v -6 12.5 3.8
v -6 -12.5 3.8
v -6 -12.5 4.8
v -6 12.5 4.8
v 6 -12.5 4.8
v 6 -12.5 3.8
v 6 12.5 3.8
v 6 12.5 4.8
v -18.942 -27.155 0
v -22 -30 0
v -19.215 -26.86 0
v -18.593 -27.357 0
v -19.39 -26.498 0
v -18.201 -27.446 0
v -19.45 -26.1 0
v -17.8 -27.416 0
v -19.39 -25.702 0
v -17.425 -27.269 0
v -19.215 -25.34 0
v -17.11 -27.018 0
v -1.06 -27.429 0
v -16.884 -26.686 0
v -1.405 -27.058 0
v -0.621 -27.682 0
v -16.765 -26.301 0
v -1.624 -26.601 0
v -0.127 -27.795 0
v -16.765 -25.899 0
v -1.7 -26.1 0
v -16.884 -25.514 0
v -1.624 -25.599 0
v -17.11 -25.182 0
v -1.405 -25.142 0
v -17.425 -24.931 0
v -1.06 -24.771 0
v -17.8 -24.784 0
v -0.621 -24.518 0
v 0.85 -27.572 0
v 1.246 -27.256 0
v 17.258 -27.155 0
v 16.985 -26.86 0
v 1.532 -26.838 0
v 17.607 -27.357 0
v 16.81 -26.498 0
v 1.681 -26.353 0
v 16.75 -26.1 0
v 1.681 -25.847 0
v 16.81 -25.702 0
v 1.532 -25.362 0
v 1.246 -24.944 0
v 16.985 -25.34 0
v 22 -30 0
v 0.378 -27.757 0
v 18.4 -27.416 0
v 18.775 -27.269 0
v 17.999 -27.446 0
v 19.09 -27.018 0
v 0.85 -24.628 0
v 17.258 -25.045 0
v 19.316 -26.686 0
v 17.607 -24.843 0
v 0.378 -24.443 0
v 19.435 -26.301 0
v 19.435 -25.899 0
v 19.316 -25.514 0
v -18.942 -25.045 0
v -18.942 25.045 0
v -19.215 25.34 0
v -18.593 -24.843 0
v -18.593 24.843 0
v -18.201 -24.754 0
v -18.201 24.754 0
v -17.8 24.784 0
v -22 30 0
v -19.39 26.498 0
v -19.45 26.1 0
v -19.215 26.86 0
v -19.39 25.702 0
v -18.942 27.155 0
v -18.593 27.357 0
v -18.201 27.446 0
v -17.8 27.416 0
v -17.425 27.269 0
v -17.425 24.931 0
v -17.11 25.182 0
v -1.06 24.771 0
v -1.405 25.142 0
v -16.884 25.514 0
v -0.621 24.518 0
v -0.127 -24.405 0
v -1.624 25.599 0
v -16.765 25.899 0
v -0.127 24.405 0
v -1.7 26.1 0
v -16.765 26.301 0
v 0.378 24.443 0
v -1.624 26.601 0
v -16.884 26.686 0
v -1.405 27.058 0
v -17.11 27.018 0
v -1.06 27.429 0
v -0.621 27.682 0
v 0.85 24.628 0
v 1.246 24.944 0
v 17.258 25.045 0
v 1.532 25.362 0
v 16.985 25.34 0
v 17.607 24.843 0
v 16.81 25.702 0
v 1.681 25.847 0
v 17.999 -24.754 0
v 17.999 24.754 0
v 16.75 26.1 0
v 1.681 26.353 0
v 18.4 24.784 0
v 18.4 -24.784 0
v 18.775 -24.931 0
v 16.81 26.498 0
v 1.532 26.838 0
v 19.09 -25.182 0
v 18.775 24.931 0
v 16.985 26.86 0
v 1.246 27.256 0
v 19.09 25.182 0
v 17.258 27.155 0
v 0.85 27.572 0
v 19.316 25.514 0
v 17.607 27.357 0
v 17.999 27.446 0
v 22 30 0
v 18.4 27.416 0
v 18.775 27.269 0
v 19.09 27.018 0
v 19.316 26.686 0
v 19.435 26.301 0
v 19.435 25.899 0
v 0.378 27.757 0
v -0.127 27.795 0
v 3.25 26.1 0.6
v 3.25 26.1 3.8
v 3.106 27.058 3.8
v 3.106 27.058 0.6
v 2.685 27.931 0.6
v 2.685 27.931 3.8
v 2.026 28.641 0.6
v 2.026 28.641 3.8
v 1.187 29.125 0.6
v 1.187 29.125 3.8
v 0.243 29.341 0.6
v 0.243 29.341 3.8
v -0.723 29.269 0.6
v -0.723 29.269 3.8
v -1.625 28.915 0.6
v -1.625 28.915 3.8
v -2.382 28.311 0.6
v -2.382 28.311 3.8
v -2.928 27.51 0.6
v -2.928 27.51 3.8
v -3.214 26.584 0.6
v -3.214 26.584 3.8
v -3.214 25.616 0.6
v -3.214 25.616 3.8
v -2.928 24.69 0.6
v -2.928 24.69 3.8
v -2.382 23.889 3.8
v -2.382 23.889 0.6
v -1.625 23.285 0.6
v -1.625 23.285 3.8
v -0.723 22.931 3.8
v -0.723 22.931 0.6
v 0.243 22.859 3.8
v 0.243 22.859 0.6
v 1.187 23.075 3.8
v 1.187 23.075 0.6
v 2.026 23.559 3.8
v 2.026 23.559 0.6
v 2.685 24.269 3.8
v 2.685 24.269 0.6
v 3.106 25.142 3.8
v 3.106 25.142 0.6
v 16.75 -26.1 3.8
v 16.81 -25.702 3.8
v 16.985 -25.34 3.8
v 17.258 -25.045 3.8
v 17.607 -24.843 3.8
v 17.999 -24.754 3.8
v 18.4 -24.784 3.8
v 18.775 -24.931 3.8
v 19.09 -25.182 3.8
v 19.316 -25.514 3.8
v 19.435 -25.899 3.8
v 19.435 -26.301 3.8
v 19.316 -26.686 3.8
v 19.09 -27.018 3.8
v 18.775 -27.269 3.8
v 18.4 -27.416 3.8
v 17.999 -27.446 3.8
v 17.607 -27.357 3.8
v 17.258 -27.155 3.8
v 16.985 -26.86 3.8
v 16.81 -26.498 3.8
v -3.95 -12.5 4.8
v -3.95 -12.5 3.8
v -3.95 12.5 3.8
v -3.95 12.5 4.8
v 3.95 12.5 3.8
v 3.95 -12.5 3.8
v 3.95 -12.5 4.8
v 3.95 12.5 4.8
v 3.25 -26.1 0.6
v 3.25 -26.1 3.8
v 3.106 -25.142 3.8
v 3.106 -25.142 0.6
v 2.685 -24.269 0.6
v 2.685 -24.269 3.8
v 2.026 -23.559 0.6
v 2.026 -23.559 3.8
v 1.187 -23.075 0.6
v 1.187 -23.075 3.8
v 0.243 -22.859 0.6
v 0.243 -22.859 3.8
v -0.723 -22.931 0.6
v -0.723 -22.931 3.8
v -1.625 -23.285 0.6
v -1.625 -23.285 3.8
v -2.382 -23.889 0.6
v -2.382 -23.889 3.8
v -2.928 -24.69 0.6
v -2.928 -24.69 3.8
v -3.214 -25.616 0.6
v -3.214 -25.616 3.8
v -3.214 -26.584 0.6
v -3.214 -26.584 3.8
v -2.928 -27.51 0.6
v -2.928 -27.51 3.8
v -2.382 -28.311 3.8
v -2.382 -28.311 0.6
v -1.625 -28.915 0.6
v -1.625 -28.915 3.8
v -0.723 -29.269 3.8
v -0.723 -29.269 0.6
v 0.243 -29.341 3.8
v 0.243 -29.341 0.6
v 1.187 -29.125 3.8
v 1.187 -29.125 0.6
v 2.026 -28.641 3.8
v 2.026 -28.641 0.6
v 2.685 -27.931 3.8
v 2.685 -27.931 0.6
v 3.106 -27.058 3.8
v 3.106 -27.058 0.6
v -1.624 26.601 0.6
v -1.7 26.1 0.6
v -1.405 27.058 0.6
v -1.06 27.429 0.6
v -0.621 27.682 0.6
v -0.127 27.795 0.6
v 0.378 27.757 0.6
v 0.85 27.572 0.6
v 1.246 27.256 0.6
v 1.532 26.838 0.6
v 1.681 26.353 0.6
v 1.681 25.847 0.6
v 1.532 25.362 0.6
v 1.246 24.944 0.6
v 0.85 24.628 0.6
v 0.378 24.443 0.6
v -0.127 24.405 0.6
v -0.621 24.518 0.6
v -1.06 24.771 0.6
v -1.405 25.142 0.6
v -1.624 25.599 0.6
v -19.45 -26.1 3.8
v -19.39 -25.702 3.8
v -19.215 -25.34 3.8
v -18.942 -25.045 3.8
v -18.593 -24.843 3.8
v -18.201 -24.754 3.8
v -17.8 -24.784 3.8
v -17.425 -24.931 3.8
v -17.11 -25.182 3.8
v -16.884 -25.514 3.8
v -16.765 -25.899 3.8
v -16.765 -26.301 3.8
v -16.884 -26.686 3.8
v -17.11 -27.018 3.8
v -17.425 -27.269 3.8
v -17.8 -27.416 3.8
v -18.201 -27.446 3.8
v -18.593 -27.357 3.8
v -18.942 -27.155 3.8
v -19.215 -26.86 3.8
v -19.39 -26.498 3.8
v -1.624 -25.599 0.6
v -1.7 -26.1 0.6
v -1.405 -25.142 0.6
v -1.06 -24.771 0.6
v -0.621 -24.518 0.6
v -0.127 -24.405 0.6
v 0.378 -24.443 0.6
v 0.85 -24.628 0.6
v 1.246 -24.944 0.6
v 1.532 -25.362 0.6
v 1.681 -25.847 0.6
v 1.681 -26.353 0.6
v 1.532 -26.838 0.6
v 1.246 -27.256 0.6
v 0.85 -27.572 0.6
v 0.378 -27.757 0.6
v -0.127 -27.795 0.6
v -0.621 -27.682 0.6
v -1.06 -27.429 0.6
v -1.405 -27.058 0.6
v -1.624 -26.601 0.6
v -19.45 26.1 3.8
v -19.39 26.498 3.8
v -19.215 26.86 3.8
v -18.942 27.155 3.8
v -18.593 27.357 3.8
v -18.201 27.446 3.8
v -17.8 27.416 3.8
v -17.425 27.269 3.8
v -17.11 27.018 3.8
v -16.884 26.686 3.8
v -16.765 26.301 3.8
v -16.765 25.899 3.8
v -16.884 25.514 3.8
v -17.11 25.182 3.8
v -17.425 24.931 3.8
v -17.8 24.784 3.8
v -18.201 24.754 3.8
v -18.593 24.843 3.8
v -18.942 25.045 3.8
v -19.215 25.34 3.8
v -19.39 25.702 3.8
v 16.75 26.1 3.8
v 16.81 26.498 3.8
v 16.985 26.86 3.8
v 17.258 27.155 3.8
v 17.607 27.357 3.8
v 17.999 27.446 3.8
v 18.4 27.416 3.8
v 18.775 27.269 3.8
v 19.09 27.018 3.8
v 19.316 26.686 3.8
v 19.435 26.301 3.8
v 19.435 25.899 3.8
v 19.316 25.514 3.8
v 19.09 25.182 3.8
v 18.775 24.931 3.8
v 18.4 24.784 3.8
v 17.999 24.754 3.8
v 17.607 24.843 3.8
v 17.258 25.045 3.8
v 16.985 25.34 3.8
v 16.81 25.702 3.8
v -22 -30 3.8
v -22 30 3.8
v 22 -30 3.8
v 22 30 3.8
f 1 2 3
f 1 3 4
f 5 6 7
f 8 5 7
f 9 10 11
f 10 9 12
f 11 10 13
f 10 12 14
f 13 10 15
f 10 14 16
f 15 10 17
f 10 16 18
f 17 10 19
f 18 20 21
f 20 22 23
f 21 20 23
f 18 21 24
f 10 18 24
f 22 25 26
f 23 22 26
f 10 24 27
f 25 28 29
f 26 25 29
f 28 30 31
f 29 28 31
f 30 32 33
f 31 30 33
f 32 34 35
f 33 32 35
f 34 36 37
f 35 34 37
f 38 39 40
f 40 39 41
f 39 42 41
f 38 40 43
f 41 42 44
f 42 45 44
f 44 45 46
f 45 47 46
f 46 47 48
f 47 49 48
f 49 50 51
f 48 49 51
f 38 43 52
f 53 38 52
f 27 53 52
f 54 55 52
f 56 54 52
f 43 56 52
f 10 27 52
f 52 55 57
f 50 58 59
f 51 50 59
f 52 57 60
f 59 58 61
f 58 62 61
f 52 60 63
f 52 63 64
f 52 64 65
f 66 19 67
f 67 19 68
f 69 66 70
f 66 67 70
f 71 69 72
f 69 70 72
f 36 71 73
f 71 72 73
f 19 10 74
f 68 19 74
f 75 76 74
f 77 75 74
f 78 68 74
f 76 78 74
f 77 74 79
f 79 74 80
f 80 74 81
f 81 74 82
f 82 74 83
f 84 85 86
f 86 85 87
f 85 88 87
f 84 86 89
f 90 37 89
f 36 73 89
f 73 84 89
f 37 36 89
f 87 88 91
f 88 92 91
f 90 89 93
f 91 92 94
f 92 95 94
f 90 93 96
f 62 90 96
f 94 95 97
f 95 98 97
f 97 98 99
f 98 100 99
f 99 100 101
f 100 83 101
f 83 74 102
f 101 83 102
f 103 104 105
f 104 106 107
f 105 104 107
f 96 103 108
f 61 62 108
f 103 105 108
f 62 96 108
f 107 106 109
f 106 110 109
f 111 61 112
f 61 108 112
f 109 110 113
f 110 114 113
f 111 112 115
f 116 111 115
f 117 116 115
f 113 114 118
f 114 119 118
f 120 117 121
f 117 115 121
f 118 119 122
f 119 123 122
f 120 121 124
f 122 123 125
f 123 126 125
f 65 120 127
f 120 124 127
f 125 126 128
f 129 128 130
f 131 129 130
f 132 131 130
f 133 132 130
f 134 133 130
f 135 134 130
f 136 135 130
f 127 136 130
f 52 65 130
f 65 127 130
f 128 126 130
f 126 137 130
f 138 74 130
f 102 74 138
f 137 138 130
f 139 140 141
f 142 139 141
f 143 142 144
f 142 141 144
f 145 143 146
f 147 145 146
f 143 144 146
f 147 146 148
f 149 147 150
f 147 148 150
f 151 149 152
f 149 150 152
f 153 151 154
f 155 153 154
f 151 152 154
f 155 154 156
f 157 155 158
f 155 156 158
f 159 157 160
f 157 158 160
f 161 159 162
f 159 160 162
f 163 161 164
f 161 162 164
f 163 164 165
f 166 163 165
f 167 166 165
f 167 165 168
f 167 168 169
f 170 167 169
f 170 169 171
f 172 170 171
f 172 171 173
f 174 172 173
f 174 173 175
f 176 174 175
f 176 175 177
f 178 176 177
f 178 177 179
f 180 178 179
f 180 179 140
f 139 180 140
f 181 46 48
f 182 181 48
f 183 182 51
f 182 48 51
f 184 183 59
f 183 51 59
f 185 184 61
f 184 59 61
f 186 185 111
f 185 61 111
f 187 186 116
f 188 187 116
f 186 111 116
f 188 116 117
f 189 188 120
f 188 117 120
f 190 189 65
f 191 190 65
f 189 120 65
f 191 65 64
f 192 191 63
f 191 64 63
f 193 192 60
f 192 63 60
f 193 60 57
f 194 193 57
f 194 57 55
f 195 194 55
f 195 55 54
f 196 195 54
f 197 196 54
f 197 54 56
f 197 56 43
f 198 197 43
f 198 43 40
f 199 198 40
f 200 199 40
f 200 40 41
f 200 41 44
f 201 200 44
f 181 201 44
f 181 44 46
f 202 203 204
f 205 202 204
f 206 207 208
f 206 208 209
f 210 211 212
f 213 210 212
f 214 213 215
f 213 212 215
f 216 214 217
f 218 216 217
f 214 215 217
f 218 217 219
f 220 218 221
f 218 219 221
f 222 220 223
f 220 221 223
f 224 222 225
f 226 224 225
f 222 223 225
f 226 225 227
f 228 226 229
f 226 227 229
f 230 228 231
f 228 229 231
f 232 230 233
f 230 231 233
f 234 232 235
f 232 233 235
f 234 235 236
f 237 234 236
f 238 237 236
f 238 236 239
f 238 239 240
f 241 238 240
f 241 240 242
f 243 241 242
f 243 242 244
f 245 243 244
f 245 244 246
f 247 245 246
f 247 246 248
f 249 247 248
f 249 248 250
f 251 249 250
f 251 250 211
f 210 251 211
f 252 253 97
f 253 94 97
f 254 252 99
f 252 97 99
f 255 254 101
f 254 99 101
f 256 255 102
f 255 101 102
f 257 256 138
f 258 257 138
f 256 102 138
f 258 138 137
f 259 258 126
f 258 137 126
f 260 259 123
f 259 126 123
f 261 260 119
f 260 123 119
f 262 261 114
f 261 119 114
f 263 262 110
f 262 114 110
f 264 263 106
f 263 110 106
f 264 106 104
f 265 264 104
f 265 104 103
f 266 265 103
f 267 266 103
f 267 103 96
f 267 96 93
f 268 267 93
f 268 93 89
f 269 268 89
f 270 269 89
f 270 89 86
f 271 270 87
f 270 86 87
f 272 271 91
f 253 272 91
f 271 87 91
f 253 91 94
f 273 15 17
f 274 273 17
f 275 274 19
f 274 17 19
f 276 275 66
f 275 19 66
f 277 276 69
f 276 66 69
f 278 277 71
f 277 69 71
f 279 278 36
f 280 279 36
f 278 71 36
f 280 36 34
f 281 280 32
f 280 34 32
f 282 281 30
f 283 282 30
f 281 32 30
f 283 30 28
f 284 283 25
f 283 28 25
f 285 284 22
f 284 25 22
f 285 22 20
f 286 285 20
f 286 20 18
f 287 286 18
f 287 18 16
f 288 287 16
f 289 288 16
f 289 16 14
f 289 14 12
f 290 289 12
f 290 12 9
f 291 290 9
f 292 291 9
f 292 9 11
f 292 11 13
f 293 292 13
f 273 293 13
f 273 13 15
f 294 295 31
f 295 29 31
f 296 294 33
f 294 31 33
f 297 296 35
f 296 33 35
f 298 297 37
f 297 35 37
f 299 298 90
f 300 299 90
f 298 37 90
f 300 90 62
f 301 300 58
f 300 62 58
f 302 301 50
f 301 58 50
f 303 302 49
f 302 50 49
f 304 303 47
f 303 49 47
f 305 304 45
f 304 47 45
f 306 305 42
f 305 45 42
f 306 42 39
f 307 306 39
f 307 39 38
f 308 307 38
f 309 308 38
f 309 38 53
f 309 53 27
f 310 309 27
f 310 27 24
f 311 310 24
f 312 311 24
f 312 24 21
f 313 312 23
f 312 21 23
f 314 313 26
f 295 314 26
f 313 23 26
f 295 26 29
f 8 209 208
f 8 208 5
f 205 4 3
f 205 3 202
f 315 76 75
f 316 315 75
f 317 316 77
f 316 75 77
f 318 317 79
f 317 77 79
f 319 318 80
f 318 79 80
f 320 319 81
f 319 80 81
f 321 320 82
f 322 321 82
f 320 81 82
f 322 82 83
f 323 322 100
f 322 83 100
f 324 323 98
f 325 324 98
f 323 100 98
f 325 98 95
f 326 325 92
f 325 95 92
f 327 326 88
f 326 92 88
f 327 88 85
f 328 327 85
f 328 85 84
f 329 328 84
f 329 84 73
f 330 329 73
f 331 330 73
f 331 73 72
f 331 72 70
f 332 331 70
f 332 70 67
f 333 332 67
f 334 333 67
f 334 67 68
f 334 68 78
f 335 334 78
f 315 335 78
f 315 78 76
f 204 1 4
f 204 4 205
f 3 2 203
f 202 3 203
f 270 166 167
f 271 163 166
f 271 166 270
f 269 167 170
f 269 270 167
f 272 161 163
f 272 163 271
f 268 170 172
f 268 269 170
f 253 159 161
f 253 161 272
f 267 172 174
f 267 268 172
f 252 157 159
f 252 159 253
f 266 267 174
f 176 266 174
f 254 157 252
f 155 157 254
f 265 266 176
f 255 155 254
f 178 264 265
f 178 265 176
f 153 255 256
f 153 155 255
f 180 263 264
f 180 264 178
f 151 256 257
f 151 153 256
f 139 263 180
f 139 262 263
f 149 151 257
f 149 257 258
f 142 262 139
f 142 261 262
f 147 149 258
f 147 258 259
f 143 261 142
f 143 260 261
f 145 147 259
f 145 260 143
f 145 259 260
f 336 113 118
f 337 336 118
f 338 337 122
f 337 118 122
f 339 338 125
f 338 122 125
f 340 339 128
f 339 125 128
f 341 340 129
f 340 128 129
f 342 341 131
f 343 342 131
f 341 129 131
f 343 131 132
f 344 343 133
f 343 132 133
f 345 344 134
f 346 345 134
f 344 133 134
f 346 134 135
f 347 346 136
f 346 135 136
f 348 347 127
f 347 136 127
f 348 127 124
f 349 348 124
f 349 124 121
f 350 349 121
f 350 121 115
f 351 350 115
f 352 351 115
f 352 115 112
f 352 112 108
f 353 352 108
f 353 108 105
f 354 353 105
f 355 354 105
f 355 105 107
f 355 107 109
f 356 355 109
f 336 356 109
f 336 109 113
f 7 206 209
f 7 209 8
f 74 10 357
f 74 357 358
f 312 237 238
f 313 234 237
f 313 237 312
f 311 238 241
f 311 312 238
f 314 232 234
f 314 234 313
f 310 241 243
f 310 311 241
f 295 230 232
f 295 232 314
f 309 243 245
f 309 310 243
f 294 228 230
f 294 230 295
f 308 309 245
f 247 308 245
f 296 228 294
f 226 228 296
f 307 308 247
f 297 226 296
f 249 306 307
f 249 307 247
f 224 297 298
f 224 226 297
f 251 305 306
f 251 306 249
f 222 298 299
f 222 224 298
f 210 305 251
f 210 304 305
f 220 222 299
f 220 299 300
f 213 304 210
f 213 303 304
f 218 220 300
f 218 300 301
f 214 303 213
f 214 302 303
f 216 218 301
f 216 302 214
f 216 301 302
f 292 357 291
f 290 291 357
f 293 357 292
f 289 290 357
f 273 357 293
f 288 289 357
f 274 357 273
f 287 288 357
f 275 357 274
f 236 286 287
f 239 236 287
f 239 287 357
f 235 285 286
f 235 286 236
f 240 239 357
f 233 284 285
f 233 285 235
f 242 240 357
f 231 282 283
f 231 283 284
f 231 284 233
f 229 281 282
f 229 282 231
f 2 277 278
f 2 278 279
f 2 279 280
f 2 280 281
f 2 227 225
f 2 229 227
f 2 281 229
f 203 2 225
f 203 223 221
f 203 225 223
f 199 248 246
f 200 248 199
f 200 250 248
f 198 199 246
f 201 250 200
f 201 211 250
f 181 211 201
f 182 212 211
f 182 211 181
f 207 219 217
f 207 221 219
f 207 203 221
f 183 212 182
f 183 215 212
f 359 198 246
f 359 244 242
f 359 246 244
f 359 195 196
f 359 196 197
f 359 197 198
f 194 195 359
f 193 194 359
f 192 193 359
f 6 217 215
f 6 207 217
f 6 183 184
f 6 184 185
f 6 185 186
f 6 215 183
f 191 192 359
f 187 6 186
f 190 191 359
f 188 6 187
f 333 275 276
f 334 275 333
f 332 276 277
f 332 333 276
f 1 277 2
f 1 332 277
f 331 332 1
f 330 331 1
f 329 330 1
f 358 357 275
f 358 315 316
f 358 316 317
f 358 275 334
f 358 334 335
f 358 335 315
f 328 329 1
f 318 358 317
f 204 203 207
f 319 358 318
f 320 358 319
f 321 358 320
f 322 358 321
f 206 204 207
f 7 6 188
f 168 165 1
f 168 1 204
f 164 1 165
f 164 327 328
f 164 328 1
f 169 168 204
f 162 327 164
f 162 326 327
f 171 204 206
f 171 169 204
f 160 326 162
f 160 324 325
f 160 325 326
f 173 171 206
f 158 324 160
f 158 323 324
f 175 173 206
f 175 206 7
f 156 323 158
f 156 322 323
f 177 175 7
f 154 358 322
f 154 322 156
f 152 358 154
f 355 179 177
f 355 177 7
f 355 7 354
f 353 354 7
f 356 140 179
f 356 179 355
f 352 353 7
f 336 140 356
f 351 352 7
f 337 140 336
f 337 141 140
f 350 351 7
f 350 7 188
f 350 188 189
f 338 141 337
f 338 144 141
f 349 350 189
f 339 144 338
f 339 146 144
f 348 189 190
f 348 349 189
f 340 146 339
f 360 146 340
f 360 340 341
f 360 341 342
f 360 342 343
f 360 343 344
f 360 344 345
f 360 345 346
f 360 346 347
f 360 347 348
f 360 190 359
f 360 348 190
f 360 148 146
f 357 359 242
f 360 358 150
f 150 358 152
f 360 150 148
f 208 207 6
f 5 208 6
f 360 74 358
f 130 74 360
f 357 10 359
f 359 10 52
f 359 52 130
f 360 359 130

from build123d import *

# Parameters (mm, degrees)
F0_W           = 44
F0_H           = 60
F1_DEPTH       = 3.8
F3_D           = 2.7
F4_D           = 3.4
F4_CBORE_D     = 6.5
F4_CBORE_DEPTH = 3.2
F5_W           = 2.05
F5_H           = 25
F6_DEPTH       = 1


with BuildPart() as f1:
    # F0 (on Top) → F1 (new body)
    with BuildSketch(Plane.XY):
        Rectangle(F0_W, F0_H)
    extrude(amount=F1_DEPTH)

    # F3 (through all)
    with Locations(Plane.XY.offset(3.8)):
        with Locations((-18.1, 26.1), (18.1, 26.1), (18.1, -26.1), (-18.1, -26.1)):
            Hole(F3_D / 2)

    # F4 (through all)
    with Locations(Plane.XY.offset(3.8)):
        with Locations((0, 26.1), (0, -26.1)):
            CounterBoreHole(F4_D / 2, F4_CBORE_D / 2, F4_CBORE_DEPTH)

    # F5 (on face) → F6 (join)
    with BuildSketch(Plane.XY.offset(3.8)):
        with Locations((-4.975, 0)):
            Rectangle(F5_W, F5_H)
        with Locations((4.975, 0)):
            Rectangle(F5_W, F5_H)
    extrude(amount=F6_DEPTH)


solid = f1.part
